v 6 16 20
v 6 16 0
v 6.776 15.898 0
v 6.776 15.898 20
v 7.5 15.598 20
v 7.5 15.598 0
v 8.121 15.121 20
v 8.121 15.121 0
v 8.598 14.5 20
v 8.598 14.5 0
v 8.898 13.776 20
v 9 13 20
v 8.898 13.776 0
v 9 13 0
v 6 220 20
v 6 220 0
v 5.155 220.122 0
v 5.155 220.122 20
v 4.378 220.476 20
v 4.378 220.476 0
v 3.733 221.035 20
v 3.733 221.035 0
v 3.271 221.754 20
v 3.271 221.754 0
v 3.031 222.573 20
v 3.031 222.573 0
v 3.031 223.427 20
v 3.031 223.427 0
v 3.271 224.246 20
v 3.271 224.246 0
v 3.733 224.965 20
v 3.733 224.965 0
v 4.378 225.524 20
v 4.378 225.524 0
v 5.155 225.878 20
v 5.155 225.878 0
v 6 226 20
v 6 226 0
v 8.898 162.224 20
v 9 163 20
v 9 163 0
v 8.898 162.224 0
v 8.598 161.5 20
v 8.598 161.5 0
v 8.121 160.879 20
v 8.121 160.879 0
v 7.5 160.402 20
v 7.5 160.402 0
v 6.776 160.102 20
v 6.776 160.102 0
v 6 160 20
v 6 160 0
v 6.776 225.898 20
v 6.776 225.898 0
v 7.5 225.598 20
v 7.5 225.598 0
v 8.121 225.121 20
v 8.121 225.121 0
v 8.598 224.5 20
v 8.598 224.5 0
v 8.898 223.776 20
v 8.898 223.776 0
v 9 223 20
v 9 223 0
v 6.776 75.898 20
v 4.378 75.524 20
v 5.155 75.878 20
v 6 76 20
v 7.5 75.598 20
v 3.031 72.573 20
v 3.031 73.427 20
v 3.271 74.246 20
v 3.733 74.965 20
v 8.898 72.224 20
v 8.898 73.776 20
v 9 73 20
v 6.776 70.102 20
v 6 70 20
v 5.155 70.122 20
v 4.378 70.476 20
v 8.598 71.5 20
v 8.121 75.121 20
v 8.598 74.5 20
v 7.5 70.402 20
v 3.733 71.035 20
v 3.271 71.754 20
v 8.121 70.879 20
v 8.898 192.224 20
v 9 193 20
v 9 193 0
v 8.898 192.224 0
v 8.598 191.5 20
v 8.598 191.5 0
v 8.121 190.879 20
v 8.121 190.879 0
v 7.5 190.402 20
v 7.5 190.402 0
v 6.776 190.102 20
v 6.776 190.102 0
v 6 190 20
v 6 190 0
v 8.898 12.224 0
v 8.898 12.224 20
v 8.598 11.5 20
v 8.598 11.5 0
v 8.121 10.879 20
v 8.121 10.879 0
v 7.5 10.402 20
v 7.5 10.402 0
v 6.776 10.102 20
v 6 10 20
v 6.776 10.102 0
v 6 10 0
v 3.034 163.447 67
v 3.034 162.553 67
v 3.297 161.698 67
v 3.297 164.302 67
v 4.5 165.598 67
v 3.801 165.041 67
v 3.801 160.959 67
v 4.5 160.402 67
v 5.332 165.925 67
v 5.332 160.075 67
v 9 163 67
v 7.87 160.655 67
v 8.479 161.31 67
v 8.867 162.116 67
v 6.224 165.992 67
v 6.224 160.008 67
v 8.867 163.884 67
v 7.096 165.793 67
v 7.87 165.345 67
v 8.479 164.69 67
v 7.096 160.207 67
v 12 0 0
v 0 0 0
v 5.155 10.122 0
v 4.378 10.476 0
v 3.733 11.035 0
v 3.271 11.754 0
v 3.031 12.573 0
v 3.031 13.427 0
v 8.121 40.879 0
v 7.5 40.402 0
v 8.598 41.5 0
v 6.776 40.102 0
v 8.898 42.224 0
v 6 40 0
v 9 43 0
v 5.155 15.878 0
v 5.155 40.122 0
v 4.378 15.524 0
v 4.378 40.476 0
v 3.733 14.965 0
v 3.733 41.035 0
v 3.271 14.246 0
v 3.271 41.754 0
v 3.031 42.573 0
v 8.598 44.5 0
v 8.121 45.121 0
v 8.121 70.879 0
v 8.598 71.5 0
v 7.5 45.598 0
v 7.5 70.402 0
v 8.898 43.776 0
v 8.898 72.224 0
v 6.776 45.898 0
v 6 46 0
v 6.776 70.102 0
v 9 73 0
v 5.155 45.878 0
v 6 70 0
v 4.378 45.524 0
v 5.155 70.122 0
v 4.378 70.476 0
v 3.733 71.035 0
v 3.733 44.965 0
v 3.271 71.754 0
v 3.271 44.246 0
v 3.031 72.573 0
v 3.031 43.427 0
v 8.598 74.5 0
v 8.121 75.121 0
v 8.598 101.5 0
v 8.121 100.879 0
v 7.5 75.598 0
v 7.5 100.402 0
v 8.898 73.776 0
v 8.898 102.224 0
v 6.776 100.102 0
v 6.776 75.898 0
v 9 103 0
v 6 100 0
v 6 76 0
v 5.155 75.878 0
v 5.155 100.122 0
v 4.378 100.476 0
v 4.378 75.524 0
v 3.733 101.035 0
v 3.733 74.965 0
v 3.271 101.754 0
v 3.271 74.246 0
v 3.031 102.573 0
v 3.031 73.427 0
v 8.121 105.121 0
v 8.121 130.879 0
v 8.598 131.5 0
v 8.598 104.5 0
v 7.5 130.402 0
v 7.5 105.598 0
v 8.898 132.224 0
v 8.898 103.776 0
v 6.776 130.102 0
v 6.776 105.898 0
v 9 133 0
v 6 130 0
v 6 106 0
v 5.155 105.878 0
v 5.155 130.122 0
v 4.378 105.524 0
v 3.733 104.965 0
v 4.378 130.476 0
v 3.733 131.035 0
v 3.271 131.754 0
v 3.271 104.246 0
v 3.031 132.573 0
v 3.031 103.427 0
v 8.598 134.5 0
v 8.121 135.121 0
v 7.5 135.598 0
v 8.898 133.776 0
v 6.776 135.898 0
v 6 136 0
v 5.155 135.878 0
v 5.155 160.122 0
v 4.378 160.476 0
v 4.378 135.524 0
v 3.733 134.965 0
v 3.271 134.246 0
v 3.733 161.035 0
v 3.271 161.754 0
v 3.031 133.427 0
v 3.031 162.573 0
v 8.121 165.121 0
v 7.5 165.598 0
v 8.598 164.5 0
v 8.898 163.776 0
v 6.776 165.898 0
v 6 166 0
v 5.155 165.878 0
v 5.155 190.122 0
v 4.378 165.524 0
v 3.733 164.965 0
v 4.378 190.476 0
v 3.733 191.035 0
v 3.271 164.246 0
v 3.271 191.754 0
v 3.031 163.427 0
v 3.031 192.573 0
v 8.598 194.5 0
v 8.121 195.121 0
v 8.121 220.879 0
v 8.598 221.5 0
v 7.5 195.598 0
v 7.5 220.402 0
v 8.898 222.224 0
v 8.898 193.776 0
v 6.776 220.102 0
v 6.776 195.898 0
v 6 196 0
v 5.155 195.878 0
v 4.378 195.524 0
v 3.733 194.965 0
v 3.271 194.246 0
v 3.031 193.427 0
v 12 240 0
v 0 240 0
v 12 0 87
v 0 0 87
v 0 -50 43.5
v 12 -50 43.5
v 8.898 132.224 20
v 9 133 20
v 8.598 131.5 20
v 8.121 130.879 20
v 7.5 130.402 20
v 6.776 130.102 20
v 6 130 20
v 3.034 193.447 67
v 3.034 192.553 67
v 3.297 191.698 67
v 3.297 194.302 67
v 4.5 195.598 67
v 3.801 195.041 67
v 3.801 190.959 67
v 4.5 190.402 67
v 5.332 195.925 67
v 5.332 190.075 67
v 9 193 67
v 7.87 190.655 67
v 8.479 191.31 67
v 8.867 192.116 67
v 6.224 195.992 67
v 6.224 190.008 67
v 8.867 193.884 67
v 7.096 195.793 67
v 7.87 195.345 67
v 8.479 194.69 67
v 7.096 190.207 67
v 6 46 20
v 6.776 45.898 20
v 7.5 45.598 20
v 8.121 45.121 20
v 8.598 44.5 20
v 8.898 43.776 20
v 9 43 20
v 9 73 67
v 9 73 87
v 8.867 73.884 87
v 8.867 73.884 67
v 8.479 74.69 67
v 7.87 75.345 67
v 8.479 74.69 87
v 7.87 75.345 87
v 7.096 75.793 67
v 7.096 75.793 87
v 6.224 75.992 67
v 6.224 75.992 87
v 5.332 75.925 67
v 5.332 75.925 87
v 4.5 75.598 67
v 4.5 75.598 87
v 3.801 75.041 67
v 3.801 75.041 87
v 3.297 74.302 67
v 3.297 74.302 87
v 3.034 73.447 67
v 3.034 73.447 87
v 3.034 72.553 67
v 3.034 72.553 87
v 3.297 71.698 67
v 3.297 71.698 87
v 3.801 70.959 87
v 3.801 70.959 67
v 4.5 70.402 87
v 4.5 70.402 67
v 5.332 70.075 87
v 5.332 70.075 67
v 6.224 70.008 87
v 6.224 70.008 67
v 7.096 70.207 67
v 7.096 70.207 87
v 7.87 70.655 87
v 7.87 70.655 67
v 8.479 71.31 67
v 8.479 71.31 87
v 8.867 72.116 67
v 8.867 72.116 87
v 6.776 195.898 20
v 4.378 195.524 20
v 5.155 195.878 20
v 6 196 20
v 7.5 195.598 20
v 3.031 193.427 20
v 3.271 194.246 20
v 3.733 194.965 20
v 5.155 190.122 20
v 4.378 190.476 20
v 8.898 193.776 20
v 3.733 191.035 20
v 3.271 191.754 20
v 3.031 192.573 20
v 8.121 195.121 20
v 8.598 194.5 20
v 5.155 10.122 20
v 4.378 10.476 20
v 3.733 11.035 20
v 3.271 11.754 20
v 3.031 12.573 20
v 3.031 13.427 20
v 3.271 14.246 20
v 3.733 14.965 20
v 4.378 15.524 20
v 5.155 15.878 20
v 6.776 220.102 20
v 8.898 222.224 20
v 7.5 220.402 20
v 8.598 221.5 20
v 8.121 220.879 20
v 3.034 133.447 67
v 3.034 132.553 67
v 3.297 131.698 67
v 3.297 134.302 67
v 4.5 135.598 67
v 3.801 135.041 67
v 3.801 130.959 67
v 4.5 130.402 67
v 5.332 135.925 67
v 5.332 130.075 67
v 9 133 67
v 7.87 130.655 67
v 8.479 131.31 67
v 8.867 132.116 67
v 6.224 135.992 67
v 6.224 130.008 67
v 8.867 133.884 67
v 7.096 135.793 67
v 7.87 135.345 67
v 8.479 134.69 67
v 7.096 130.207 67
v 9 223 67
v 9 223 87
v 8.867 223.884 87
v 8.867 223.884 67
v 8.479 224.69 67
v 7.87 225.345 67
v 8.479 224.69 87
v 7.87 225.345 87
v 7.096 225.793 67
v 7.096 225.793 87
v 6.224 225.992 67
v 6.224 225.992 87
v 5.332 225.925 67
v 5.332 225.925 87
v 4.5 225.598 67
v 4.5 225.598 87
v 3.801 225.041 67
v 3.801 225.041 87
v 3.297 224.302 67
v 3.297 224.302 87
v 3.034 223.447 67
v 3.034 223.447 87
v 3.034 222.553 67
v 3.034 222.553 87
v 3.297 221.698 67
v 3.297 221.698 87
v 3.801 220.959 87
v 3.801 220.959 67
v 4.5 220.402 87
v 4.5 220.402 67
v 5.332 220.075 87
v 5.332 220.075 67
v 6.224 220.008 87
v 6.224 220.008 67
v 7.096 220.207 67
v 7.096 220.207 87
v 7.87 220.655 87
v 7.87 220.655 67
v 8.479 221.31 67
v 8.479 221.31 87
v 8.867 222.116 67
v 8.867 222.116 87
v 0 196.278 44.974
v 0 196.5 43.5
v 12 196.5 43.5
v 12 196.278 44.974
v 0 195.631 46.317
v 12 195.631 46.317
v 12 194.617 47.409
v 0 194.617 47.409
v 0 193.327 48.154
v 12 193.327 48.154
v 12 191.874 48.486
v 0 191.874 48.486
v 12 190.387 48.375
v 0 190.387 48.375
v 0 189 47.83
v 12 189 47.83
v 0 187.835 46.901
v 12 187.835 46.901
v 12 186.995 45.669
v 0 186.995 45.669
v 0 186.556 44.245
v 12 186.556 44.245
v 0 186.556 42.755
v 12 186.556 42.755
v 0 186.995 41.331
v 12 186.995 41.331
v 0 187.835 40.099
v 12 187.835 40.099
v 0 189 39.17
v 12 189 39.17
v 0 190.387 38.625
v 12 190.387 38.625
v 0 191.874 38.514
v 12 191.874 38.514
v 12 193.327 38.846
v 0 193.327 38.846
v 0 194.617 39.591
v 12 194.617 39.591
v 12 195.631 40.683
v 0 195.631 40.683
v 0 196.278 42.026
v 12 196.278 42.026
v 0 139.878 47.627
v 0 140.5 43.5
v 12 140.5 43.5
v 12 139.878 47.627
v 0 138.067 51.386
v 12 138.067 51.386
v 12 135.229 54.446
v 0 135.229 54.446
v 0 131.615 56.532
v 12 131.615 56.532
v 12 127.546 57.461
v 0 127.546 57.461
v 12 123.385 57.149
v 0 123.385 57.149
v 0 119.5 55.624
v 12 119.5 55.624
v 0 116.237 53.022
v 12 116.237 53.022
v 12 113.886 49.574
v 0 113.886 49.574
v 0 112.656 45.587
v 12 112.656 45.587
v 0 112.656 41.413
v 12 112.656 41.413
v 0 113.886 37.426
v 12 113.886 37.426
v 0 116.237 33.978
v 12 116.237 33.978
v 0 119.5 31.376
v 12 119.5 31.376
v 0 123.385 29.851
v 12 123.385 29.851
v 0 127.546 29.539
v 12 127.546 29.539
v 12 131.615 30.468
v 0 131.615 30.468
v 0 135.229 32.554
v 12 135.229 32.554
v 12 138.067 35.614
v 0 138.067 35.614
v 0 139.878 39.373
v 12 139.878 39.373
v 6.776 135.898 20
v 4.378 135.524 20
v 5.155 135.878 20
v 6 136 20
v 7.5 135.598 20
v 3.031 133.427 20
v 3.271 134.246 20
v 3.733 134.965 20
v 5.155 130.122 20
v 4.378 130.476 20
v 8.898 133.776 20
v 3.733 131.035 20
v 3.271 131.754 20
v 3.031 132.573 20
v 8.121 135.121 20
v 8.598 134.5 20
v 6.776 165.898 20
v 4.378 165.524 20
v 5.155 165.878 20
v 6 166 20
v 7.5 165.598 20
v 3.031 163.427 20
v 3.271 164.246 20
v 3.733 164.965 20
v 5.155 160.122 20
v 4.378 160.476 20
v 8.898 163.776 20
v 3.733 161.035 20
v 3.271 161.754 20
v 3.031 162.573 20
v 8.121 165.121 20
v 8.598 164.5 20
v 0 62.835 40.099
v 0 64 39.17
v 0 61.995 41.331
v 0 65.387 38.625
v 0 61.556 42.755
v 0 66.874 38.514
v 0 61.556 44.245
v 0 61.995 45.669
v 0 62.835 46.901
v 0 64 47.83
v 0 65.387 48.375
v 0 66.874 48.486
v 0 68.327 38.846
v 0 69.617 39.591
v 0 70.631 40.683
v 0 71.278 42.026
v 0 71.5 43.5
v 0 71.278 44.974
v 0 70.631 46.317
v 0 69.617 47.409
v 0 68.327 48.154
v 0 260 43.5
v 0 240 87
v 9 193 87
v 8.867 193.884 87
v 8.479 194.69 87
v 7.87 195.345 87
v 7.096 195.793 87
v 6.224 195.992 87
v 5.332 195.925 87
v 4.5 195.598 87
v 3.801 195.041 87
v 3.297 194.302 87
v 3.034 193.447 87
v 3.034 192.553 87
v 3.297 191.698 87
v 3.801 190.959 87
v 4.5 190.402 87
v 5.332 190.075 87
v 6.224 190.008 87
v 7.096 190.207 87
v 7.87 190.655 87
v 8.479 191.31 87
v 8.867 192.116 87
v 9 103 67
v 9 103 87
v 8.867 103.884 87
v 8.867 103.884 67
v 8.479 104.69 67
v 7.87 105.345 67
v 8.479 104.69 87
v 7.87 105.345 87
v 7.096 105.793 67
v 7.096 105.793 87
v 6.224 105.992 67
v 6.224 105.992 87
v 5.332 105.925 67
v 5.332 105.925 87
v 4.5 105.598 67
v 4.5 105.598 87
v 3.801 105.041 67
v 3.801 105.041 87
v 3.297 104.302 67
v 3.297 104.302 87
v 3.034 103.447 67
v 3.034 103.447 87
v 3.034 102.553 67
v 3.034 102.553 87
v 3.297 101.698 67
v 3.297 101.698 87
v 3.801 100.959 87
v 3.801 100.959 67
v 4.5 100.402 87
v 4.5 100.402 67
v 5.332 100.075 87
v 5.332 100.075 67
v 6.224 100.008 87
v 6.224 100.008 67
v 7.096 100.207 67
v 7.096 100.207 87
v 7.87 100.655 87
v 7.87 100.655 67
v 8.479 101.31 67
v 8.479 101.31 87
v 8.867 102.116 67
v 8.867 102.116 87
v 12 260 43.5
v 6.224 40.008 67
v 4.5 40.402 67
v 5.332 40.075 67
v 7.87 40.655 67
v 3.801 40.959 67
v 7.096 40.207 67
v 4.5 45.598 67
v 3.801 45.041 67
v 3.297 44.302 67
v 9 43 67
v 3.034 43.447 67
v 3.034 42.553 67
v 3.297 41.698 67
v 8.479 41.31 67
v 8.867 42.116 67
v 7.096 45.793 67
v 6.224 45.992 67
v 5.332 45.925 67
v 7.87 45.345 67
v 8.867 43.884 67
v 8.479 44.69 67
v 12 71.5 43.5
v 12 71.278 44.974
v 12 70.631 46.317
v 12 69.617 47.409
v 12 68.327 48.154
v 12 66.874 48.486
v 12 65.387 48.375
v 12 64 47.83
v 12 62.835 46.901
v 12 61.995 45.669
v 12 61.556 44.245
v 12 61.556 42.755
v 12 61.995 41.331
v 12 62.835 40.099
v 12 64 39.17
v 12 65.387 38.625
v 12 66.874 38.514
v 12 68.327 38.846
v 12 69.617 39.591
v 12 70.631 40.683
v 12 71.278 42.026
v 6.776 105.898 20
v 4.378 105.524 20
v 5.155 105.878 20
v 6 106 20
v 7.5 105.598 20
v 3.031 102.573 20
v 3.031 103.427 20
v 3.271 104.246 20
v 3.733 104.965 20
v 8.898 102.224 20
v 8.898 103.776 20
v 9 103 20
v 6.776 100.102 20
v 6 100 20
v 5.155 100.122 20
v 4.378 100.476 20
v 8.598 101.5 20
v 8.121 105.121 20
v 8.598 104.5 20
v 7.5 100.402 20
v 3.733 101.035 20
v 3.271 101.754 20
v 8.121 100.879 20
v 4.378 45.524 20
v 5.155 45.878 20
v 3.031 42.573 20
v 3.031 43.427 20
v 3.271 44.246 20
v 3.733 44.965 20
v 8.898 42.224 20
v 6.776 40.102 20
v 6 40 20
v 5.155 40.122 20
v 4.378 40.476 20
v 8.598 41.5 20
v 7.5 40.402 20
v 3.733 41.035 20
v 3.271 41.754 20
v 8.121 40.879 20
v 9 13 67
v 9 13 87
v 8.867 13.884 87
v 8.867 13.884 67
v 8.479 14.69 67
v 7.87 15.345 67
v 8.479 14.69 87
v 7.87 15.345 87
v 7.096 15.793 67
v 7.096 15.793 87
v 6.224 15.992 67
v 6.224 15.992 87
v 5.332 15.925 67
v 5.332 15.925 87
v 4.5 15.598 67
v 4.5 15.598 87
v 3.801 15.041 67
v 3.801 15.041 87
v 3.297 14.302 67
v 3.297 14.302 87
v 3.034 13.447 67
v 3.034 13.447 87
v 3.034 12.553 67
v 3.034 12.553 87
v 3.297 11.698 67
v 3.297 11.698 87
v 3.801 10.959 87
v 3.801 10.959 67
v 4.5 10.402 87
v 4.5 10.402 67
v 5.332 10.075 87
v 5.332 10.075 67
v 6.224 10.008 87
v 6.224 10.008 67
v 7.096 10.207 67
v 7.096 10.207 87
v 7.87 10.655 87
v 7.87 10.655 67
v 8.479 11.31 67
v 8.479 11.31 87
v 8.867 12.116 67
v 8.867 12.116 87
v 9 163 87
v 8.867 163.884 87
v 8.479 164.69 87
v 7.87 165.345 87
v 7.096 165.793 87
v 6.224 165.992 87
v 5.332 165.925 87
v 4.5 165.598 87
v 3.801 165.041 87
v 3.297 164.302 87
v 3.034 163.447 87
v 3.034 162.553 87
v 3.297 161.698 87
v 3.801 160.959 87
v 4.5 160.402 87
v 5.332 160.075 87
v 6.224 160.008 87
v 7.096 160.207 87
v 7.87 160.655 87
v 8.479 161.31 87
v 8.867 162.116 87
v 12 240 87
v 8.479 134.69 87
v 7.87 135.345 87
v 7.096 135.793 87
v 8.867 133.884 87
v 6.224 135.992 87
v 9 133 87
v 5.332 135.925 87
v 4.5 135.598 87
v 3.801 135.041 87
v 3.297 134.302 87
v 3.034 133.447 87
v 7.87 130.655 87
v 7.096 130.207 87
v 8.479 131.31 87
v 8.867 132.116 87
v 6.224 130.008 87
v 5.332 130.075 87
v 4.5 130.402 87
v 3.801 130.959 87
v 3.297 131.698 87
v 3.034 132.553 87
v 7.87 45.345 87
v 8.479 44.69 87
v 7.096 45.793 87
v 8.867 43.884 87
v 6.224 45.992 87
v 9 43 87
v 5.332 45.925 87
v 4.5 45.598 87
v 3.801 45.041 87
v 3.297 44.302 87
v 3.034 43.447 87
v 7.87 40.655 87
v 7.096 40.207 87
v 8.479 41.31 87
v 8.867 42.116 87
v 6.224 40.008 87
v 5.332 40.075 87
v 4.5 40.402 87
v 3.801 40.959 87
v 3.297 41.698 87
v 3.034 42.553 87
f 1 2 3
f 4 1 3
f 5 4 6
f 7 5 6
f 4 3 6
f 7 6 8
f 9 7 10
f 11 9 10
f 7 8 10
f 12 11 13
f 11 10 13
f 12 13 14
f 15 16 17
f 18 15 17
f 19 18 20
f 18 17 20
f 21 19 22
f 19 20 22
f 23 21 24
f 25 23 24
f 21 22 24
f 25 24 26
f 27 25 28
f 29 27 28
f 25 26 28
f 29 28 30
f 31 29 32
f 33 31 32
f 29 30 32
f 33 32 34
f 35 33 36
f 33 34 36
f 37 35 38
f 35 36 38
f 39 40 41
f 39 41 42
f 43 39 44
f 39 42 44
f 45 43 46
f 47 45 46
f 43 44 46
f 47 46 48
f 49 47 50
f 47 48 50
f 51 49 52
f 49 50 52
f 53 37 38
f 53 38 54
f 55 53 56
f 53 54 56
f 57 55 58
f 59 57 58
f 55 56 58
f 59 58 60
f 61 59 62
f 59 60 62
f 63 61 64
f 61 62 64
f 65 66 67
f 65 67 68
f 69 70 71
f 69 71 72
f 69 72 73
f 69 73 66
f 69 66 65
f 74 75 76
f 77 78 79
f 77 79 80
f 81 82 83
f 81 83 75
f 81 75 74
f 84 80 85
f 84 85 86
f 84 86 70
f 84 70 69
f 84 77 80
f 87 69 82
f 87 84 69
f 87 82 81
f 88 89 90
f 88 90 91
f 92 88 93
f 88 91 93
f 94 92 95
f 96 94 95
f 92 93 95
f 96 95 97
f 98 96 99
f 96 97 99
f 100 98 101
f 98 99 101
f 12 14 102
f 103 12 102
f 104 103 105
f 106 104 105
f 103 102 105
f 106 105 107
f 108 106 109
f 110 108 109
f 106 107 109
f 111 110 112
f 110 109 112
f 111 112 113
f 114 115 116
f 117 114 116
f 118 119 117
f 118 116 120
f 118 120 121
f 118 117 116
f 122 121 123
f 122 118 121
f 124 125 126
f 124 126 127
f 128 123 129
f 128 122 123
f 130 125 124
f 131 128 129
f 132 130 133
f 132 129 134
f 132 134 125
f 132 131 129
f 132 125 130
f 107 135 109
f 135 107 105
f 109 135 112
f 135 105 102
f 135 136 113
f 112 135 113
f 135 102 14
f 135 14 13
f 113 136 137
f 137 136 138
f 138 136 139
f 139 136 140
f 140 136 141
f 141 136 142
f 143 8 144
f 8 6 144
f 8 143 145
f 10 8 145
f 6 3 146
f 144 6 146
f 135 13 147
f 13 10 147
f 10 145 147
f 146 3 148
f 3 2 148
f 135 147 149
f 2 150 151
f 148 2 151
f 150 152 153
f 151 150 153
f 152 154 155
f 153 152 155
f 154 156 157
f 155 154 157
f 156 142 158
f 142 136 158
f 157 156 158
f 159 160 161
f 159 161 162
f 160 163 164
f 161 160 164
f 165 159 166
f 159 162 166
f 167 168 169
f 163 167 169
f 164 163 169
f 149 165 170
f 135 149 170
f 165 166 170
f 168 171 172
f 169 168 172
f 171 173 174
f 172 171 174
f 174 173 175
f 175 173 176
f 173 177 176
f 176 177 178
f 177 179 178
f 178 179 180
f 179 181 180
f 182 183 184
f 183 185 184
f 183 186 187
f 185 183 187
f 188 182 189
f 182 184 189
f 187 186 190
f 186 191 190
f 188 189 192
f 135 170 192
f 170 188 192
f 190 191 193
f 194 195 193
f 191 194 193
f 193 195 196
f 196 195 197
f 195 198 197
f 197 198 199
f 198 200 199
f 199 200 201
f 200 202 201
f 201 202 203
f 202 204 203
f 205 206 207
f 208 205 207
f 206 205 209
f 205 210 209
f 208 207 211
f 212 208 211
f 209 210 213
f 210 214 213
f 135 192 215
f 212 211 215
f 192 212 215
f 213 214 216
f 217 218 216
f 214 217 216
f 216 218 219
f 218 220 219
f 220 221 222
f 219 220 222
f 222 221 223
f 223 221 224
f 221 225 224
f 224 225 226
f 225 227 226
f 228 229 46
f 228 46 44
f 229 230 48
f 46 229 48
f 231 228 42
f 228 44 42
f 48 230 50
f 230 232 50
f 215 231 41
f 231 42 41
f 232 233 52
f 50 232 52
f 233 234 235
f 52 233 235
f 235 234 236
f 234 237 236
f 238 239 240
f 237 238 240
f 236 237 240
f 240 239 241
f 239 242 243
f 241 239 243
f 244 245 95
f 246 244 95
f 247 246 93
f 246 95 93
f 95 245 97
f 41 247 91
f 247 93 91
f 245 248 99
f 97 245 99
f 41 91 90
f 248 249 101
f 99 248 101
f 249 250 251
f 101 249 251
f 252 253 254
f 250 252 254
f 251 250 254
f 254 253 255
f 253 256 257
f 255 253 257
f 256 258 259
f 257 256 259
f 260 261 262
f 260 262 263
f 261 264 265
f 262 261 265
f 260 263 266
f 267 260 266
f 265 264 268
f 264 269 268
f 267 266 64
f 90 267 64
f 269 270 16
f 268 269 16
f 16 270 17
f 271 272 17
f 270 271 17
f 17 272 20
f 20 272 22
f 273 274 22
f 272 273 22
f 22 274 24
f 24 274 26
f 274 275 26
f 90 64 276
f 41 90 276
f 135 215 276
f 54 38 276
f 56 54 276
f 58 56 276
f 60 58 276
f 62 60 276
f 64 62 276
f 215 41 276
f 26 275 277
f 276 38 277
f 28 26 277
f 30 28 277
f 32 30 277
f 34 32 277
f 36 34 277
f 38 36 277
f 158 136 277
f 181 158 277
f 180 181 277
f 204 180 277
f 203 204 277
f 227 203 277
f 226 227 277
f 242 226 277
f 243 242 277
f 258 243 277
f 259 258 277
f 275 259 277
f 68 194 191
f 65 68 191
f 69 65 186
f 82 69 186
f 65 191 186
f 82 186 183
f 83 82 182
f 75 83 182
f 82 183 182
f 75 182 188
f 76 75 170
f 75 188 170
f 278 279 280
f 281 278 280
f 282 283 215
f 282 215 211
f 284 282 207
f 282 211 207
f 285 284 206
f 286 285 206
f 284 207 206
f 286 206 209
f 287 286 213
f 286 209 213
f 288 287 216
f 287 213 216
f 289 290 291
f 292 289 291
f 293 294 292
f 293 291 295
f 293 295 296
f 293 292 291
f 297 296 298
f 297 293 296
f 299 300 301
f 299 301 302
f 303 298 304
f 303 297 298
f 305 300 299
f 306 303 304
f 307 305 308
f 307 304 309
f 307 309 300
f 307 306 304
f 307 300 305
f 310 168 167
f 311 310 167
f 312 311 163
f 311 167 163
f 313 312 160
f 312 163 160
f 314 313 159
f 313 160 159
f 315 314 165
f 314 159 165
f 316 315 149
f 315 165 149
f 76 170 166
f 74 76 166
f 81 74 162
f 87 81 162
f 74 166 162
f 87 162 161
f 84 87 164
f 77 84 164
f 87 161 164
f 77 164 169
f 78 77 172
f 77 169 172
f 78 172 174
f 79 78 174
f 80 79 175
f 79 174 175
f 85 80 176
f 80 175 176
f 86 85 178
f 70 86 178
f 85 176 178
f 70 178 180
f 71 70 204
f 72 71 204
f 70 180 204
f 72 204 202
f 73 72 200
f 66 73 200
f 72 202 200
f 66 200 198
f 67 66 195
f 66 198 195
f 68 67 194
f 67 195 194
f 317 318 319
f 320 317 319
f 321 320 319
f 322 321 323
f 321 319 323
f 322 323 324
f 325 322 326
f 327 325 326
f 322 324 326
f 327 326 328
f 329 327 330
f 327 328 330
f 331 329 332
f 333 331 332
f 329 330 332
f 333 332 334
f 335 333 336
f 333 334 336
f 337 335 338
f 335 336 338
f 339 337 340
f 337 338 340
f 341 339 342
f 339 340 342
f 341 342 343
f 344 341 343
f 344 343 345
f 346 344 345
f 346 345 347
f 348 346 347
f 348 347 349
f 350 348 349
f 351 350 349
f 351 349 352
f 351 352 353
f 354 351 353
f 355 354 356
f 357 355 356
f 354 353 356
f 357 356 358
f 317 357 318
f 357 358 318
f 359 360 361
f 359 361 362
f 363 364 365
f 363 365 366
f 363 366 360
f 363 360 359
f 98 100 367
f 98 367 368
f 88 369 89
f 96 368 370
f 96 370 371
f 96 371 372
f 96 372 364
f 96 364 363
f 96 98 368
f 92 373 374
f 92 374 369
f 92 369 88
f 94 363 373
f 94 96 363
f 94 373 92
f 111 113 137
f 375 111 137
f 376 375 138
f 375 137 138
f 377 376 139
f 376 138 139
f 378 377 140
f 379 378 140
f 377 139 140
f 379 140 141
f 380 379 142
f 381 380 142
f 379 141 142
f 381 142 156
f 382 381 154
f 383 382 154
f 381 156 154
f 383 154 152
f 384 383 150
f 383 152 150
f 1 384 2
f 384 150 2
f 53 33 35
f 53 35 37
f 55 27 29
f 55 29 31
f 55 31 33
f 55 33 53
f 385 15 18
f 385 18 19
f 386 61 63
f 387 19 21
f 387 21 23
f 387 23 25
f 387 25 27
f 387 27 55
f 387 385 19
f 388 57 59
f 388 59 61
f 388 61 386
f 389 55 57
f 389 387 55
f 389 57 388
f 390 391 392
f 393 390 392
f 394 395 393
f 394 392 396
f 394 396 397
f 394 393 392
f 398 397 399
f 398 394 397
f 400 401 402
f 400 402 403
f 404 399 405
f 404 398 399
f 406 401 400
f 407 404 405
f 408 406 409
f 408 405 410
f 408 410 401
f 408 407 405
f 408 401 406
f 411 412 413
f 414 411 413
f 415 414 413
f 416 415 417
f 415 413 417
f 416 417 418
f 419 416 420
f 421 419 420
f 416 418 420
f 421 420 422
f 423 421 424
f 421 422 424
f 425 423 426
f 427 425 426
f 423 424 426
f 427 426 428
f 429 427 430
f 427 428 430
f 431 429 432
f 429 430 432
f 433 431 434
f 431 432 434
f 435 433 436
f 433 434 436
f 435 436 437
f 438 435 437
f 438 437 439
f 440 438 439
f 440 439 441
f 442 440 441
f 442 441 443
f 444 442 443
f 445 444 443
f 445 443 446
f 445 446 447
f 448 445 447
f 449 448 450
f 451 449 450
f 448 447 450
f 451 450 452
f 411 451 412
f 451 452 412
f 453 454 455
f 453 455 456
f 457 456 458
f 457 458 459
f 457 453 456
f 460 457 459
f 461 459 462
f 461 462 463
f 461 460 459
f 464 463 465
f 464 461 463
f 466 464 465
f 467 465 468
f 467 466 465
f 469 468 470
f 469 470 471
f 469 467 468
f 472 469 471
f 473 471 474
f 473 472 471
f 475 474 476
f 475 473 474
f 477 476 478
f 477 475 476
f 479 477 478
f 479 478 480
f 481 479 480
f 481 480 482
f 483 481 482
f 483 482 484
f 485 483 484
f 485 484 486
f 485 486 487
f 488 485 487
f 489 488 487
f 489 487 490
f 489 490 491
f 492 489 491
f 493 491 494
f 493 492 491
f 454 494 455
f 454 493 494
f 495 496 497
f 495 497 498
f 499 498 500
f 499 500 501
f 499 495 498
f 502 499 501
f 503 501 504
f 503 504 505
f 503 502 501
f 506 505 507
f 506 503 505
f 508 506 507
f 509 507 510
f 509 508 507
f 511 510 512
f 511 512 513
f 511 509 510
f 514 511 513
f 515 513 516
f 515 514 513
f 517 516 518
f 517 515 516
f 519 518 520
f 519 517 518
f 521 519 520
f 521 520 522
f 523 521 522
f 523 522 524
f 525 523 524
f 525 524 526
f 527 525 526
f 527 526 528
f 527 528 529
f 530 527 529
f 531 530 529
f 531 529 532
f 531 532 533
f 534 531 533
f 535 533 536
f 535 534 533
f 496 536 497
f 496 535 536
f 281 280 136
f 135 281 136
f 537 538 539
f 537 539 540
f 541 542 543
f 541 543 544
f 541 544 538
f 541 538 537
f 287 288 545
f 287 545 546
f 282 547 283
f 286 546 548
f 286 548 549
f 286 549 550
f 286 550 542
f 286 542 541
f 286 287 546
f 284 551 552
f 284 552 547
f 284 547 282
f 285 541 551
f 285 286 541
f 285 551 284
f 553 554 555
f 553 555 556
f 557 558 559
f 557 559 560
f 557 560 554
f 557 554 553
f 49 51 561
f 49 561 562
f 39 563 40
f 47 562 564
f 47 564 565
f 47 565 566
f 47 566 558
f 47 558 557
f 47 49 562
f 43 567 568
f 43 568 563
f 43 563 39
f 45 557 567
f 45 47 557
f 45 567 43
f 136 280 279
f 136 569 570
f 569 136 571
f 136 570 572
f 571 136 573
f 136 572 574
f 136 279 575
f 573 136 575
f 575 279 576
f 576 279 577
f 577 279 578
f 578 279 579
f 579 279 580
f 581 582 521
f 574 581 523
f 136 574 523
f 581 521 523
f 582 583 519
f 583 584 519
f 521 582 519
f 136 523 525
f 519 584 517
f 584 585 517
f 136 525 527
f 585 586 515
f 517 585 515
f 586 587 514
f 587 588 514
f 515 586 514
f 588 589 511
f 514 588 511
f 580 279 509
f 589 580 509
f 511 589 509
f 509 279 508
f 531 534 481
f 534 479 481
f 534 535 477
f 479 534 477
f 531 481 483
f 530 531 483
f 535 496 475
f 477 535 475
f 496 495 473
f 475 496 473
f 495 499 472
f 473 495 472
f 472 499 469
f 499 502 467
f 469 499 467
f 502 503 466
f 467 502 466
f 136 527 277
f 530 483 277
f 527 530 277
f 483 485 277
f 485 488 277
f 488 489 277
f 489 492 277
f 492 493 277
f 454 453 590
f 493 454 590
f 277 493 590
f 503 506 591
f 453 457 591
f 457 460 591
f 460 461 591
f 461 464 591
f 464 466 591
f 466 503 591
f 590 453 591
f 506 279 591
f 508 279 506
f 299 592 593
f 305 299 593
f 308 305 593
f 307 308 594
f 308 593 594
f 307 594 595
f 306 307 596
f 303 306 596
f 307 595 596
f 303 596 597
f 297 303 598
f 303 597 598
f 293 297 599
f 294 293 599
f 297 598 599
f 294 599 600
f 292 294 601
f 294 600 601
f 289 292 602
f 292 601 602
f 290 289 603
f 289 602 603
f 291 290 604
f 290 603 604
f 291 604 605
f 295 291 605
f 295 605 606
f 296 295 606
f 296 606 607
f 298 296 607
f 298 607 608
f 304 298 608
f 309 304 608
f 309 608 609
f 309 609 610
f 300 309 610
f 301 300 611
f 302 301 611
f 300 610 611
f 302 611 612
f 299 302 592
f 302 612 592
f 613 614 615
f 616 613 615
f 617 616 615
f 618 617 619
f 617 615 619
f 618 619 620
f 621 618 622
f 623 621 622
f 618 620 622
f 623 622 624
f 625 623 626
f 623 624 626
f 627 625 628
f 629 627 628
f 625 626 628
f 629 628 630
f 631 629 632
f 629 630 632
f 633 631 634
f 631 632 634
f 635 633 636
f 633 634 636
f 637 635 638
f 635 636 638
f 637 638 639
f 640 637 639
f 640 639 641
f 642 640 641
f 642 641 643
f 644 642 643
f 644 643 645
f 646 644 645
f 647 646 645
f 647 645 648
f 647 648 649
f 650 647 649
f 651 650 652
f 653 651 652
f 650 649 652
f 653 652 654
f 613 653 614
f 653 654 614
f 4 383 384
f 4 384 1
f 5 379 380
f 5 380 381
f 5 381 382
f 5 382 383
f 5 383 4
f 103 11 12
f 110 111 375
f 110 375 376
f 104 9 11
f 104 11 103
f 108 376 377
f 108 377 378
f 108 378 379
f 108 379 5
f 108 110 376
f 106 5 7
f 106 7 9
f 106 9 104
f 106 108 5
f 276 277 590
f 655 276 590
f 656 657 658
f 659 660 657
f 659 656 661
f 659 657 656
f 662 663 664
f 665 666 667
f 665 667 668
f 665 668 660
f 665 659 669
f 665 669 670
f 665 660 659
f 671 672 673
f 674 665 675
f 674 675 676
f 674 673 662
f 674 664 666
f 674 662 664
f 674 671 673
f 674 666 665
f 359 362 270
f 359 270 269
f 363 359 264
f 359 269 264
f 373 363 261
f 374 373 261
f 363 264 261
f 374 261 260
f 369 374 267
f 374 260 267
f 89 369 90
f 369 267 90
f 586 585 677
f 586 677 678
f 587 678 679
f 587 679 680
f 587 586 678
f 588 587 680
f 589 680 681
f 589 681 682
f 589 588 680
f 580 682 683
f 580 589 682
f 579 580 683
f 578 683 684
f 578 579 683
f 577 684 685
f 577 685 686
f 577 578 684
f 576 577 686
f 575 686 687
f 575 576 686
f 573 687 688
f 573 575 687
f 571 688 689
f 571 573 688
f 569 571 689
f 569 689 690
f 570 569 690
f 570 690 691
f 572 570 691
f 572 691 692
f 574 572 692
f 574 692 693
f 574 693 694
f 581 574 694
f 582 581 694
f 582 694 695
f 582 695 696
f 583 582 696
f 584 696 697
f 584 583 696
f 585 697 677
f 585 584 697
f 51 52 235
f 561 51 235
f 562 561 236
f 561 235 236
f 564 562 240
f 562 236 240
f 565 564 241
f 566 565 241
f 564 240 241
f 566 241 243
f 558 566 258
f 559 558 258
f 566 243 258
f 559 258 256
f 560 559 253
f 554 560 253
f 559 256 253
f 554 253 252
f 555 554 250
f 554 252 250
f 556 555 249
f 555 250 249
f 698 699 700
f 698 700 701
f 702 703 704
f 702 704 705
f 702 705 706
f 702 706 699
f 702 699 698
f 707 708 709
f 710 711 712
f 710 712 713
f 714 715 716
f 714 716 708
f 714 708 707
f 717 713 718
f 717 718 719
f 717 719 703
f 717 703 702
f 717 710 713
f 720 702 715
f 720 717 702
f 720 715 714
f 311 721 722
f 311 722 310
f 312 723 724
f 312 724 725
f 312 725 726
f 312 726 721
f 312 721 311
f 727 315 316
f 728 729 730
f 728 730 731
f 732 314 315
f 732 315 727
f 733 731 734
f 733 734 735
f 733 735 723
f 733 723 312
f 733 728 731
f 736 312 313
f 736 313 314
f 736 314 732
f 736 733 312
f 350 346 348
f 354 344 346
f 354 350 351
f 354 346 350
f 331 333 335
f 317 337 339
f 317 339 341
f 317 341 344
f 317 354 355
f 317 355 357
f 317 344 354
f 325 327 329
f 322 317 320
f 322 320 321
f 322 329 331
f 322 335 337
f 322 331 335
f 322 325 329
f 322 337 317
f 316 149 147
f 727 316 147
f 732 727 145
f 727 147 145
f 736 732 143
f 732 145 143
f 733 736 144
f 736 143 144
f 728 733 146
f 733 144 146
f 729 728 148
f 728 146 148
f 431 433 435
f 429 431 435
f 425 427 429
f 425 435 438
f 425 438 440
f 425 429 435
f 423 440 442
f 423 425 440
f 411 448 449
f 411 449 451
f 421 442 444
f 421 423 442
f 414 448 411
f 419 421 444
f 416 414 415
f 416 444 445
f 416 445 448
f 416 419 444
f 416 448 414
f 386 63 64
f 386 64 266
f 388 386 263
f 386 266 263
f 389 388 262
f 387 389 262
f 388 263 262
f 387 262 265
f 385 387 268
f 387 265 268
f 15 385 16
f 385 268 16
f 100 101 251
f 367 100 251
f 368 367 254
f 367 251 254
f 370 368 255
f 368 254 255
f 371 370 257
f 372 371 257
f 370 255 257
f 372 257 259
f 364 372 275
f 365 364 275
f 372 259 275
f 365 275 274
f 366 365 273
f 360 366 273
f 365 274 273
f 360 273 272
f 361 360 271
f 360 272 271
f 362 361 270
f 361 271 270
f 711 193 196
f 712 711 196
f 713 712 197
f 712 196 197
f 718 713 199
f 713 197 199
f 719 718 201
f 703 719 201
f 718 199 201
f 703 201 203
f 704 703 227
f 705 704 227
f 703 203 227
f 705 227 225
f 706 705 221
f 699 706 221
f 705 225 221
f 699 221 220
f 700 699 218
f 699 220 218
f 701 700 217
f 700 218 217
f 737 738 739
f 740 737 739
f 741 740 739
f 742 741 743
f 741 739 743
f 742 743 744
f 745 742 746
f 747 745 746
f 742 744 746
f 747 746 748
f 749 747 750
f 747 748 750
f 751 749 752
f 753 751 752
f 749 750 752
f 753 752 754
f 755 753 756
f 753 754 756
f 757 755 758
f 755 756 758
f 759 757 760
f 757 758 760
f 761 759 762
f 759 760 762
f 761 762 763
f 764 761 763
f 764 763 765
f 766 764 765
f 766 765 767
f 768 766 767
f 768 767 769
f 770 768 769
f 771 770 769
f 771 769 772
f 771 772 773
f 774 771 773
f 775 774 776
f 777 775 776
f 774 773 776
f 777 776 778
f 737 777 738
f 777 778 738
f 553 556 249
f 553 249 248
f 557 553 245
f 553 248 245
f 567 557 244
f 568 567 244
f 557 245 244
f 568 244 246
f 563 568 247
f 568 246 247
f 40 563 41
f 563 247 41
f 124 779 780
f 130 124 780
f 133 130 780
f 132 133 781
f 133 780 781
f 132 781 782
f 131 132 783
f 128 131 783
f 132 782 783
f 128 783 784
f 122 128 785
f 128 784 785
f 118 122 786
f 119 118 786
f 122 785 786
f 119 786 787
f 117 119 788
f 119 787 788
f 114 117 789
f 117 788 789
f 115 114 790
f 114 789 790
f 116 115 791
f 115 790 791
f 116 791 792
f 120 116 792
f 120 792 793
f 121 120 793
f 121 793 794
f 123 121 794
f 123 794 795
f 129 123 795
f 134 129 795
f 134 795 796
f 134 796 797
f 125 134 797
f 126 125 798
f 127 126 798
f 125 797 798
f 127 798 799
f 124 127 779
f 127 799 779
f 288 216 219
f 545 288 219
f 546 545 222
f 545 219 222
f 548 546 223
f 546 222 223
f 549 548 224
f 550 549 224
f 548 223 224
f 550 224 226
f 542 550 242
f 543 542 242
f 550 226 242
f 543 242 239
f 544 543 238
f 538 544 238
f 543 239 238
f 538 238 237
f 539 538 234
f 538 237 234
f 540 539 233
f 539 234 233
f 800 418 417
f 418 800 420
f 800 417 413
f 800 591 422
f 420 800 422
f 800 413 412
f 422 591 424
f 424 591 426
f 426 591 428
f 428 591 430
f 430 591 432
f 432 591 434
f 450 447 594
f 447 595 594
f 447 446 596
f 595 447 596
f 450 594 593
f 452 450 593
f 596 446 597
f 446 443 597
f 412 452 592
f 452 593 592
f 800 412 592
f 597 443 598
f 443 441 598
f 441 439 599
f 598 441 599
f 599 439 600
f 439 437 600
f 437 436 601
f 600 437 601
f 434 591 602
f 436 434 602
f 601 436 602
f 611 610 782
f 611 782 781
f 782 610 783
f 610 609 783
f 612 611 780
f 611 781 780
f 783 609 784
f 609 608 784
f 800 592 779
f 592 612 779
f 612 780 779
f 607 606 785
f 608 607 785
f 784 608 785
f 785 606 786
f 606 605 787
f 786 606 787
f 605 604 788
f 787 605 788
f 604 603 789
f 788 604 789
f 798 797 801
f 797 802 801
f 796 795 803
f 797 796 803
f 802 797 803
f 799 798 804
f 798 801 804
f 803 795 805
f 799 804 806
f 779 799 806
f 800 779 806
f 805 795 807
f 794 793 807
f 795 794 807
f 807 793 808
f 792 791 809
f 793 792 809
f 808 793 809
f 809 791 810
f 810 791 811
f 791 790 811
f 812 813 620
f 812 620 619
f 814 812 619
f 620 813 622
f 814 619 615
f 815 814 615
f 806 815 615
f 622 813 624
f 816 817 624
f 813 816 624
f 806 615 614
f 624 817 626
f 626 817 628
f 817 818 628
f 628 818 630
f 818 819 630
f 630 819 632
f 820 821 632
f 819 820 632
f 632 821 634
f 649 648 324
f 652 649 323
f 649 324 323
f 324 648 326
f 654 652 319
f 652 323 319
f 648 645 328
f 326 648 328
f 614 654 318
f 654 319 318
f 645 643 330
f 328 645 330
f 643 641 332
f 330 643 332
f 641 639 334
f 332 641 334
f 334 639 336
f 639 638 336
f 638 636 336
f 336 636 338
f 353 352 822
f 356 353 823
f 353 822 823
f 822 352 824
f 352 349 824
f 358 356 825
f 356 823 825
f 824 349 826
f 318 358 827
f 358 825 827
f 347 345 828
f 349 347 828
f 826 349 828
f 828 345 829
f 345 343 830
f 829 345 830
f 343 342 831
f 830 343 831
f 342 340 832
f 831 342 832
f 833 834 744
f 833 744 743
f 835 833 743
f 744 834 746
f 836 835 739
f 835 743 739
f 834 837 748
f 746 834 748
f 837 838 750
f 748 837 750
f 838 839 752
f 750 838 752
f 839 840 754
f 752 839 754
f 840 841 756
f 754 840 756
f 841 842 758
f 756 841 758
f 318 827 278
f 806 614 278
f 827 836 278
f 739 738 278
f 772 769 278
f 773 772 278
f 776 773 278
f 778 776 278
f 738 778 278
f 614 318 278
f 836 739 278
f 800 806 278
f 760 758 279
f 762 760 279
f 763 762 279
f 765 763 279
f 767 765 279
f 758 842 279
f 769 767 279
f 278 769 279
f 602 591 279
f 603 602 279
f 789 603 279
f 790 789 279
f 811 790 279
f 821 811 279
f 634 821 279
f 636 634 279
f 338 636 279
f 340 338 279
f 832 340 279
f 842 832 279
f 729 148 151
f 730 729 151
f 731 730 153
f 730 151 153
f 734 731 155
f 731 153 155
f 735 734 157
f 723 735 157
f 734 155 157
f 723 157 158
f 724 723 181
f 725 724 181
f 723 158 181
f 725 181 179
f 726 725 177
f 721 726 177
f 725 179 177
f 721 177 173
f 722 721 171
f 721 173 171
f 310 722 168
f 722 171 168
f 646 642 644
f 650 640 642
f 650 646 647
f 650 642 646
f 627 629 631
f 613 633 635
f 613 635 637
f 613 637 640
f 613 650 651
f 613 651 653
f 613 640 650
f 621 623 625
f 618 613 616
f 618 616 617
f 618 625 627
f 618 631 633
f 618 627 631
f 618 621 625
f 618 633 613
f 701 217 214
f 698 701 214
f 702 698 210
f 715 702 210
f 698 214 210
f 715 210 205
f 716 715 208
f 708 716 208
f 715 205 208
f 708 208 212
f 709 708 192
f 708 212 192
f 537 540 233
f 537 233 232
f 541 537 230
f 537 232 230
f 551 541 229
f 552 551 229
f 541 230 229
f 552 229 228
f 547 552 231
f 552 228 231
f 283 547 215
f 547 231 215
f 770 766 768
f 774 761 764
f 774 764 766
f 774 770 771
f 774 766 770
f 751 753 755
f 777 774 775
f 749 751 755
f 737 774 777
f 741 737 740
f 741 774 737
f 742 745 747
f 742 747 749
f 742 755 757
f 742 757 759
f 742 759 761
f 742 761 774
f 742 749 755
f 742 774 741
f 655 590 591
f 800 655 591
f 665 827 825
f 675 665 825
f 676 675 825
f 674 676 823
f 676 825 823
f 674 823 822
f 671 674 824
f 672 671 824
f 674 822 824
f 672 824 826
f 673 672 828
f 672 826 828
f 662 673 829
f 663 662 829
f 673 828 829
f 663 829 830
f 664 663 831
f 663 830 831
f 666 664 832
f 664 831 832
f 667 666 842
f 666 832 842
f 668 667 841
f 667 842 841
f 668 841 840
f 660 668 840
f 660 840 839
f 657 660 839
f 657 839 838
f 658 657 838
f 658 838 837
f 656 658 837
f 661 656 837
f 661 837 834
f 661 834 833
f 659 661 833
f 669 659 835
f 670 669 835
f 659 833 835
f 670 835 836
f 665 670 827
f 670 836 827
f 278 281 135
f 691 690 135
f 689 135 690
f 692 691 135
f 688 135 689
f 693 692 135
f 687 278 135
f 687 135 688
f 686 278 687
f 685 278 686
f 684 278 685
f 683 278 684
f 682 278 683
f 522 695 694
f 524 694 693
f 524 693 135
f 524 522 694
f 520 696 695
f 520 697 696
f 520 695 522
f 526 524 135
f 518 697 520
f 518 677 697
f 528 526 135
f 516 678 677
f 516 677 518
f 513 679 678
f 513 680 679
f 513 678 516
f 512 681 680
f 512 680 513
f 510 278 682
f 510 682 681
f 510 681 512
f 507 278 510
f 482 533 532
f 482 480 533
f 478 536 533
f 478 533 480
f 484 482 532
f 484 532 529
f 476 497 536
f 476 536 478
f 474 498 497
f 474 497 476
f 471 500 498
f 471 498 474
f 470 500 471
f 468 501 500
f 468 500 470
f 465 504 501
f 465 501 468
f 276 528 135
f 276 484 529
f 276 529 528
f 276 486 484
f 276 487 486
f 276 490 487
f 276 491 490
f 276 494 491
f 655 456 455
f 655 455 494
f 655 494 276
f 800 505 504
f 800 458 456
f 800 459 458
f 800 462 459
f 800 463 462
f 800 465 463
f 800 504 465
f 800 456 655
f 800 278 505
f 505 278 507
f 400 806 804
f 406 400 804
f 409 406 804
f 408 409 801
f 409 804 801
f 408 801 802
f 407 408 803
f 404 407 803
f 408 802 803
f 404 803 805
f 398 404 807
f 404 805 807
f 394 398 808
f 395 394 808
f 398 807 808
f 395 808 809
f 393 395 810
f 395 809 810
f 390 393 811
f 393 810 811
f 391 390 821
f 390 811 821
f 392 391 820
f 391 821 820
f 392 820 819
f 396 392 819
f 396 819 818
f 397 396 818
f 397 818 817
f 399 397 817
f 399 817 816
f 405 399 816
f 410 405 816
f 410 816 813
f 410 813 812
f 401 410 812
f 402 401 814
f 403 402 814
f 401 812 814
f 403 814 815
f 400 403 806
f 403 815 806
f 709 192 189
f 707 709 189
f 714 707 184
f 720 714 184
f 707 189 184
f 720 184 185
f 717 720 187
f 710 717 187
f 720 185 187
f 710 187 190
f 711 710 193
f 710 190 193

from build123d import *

# Parameters (mm, degrees)
F0_R     = 5
F0_R_2   = 14
F1_DEPTH = 12
F2_R     = 3
F3_DEPTH = 20
F5_DEPTH = 20


with BuildPart() as f1:
    # F0 (on Right) → F1 (new body)
    with BuildSketch(Plane.YZ):
        Polygon((-50, 43.5), (0, 0), (240, 0), (260, 43.5), (240, 87), (0, 87), align=None)
        with Locations((66.5, 43.5)):
            Circle(F0_R, mode=Mode.SUBTRACT)
        with Locations((126.5, 43.5)):
            Circle(F0_R_2, mode=Mode.SUBTRACT)
        with Locations((191.5, 43.5)):
            Circle(F0_R, mode=Mode.SUBTRACT)
    extrude(amount=F1_DEPTH)

    # F2 (on face) → F3 (cut)
    with BuildSketch(Plane.XY.offset(87)):
        with Locations((6, 13)):
            Circle(F2_R)
        with Locations((6, 43)):
            Circle(F2_R)
        with Locations((6, 73)):
            Circle(F2_R)
        with Locations((6, 103)):
            Circle(F2_R)
        with Locations((6, 133)):
            Circle(F2_R)
        with Locations((6, 163)):
            Circle(F2_R)
        with Locations((6, 193)):
            Circle(F2_R)
        with Locations((6, 223)):
            Circle(F2_R)
    extrude(amount=-F3_DEPTH, mode=Mode.SUBTRACT)

    # F4 (on face) → F5 (cut)
    with BuildSketch(Plane(origin=(0, 0, 0), x_dir=(1, 0, 0), z_dir=(0, 0, -1))):
        with BuildLine():
            ThreePointArc((6, -220), (3, -223), (6, -226))
            Line((6, -226), (6, -220))
        make_face()
        with BuildLine():
            ThreePointArc((6, -10), (3, -13), (6, -16))
            Line((6, -16), (6, -13))
            Line((6, -13), (6, -10))
        make_face()
        with BuildLine():
            Line((6, -13), (6, -16))
            ThreePointArc((6, -16), (8.12132, -15.12132), (9, -13))
            Line((9, -13), (6, -13))
        make_face()
        with BuildLine():
            ThreePointArc((6, -40), (3, -43), (6, -46))
            Line((6, -46), (6, -43))
            Line((6, -43), (6, -40))
        make_face()
        with BuildLine():
            Line((6, -43), (6, -46))
            ThreePointArc((6, -46), (8.12132, -45.12132), (9, -43))
            ThreePointArc((9, -43), (8.12132, -40.87868), (6, -40))
            Line((6, -40), (6, -43))
        make_face()
        with BuildLine():
            ThreePointArc((6, -70), (3, -73), (6, -76))
            Line((6, -76), (6, -70))
        make_face()
        with BuildLine():
            Line((6, -70), (6, -76))
            ThreePointArc((6, -76), (8.12132, -75.12132), (9, -73))
            ThreePointArc((9, -73), (8.12132, -70.87868), (6, -70))
        make_face()
        with BuildLine():
            ThreePointArc((6, -100), (3, -103), (6, -106))
            Line((6, -106), (6, -100))
        make_face()
        with BuildLine():
            Line((6, -100), (6, -106))
            ThreePointArc((6, -106), (8.12132, -105.12132), (9, -103))
            ThreePointArc((9, -103), (8.12132, -100.87868), (6, -100))
        make_face()
        with BuildLine():
            ThreePointArc((6, -130), (3, -133), (6, -136))
            Line((6, -136), (6, -130))
        make_face()
        with BuildLine():
            Line((6, -130), (6, -136))
            ThreePointArc((6, -136), (8.12132, -135.12132), (9, -133))
            ThreePointArc((9, -133), (8.12132, -130.87868), (6, -130))
        make_face()
        with BuildLine():
            ThreePointArc((6, -160), (3, -163), (6, -166))
            Line((6, -166), (6, -160))
        make_face()
        with BuildLine():
            Line((6, -160), (6, -166))
            ThreePointArc((6, -166), (8.12132, -165.12132), (9, -163))
            ThreePointArc((9, -163), (8.12132, -160.87868), (6, -160))
        make_face()
        with BuildLine():
            ThreePointArc((6, -190), (3, -193), (6, -196))
            Line((6, -196), (6, -190))
        make_face()
        with BuildLine():
            Line((6, -190), (6, -196))
            ThreePointArc((6, -196), (8.12132, -195.12132), (9, -193))
            ThreePointArc((9, -193), (8.12132, -190.87868), (6, -190))
        make_face()
        with BuildLine():
            Line((6, -220), (6, -226))
            ThreePointArc((6, -226), (8.12132, -225.12132), (9, -223))
            ThreePointArc((9, -223), (8.12132, -220.87868), (6, -220))
        make_face()
        with BuildLine():
            Line((6, -10), (6, -13))
            Line((6, -13), (9, -13))
            ThreePointArc((9, -13), (8.12132, -10.87868), (6, -10))
        make_face()
    extrude(amount=-F5_DEPTH, mode=Mode.SUBTRACT)


solid = f1.part
